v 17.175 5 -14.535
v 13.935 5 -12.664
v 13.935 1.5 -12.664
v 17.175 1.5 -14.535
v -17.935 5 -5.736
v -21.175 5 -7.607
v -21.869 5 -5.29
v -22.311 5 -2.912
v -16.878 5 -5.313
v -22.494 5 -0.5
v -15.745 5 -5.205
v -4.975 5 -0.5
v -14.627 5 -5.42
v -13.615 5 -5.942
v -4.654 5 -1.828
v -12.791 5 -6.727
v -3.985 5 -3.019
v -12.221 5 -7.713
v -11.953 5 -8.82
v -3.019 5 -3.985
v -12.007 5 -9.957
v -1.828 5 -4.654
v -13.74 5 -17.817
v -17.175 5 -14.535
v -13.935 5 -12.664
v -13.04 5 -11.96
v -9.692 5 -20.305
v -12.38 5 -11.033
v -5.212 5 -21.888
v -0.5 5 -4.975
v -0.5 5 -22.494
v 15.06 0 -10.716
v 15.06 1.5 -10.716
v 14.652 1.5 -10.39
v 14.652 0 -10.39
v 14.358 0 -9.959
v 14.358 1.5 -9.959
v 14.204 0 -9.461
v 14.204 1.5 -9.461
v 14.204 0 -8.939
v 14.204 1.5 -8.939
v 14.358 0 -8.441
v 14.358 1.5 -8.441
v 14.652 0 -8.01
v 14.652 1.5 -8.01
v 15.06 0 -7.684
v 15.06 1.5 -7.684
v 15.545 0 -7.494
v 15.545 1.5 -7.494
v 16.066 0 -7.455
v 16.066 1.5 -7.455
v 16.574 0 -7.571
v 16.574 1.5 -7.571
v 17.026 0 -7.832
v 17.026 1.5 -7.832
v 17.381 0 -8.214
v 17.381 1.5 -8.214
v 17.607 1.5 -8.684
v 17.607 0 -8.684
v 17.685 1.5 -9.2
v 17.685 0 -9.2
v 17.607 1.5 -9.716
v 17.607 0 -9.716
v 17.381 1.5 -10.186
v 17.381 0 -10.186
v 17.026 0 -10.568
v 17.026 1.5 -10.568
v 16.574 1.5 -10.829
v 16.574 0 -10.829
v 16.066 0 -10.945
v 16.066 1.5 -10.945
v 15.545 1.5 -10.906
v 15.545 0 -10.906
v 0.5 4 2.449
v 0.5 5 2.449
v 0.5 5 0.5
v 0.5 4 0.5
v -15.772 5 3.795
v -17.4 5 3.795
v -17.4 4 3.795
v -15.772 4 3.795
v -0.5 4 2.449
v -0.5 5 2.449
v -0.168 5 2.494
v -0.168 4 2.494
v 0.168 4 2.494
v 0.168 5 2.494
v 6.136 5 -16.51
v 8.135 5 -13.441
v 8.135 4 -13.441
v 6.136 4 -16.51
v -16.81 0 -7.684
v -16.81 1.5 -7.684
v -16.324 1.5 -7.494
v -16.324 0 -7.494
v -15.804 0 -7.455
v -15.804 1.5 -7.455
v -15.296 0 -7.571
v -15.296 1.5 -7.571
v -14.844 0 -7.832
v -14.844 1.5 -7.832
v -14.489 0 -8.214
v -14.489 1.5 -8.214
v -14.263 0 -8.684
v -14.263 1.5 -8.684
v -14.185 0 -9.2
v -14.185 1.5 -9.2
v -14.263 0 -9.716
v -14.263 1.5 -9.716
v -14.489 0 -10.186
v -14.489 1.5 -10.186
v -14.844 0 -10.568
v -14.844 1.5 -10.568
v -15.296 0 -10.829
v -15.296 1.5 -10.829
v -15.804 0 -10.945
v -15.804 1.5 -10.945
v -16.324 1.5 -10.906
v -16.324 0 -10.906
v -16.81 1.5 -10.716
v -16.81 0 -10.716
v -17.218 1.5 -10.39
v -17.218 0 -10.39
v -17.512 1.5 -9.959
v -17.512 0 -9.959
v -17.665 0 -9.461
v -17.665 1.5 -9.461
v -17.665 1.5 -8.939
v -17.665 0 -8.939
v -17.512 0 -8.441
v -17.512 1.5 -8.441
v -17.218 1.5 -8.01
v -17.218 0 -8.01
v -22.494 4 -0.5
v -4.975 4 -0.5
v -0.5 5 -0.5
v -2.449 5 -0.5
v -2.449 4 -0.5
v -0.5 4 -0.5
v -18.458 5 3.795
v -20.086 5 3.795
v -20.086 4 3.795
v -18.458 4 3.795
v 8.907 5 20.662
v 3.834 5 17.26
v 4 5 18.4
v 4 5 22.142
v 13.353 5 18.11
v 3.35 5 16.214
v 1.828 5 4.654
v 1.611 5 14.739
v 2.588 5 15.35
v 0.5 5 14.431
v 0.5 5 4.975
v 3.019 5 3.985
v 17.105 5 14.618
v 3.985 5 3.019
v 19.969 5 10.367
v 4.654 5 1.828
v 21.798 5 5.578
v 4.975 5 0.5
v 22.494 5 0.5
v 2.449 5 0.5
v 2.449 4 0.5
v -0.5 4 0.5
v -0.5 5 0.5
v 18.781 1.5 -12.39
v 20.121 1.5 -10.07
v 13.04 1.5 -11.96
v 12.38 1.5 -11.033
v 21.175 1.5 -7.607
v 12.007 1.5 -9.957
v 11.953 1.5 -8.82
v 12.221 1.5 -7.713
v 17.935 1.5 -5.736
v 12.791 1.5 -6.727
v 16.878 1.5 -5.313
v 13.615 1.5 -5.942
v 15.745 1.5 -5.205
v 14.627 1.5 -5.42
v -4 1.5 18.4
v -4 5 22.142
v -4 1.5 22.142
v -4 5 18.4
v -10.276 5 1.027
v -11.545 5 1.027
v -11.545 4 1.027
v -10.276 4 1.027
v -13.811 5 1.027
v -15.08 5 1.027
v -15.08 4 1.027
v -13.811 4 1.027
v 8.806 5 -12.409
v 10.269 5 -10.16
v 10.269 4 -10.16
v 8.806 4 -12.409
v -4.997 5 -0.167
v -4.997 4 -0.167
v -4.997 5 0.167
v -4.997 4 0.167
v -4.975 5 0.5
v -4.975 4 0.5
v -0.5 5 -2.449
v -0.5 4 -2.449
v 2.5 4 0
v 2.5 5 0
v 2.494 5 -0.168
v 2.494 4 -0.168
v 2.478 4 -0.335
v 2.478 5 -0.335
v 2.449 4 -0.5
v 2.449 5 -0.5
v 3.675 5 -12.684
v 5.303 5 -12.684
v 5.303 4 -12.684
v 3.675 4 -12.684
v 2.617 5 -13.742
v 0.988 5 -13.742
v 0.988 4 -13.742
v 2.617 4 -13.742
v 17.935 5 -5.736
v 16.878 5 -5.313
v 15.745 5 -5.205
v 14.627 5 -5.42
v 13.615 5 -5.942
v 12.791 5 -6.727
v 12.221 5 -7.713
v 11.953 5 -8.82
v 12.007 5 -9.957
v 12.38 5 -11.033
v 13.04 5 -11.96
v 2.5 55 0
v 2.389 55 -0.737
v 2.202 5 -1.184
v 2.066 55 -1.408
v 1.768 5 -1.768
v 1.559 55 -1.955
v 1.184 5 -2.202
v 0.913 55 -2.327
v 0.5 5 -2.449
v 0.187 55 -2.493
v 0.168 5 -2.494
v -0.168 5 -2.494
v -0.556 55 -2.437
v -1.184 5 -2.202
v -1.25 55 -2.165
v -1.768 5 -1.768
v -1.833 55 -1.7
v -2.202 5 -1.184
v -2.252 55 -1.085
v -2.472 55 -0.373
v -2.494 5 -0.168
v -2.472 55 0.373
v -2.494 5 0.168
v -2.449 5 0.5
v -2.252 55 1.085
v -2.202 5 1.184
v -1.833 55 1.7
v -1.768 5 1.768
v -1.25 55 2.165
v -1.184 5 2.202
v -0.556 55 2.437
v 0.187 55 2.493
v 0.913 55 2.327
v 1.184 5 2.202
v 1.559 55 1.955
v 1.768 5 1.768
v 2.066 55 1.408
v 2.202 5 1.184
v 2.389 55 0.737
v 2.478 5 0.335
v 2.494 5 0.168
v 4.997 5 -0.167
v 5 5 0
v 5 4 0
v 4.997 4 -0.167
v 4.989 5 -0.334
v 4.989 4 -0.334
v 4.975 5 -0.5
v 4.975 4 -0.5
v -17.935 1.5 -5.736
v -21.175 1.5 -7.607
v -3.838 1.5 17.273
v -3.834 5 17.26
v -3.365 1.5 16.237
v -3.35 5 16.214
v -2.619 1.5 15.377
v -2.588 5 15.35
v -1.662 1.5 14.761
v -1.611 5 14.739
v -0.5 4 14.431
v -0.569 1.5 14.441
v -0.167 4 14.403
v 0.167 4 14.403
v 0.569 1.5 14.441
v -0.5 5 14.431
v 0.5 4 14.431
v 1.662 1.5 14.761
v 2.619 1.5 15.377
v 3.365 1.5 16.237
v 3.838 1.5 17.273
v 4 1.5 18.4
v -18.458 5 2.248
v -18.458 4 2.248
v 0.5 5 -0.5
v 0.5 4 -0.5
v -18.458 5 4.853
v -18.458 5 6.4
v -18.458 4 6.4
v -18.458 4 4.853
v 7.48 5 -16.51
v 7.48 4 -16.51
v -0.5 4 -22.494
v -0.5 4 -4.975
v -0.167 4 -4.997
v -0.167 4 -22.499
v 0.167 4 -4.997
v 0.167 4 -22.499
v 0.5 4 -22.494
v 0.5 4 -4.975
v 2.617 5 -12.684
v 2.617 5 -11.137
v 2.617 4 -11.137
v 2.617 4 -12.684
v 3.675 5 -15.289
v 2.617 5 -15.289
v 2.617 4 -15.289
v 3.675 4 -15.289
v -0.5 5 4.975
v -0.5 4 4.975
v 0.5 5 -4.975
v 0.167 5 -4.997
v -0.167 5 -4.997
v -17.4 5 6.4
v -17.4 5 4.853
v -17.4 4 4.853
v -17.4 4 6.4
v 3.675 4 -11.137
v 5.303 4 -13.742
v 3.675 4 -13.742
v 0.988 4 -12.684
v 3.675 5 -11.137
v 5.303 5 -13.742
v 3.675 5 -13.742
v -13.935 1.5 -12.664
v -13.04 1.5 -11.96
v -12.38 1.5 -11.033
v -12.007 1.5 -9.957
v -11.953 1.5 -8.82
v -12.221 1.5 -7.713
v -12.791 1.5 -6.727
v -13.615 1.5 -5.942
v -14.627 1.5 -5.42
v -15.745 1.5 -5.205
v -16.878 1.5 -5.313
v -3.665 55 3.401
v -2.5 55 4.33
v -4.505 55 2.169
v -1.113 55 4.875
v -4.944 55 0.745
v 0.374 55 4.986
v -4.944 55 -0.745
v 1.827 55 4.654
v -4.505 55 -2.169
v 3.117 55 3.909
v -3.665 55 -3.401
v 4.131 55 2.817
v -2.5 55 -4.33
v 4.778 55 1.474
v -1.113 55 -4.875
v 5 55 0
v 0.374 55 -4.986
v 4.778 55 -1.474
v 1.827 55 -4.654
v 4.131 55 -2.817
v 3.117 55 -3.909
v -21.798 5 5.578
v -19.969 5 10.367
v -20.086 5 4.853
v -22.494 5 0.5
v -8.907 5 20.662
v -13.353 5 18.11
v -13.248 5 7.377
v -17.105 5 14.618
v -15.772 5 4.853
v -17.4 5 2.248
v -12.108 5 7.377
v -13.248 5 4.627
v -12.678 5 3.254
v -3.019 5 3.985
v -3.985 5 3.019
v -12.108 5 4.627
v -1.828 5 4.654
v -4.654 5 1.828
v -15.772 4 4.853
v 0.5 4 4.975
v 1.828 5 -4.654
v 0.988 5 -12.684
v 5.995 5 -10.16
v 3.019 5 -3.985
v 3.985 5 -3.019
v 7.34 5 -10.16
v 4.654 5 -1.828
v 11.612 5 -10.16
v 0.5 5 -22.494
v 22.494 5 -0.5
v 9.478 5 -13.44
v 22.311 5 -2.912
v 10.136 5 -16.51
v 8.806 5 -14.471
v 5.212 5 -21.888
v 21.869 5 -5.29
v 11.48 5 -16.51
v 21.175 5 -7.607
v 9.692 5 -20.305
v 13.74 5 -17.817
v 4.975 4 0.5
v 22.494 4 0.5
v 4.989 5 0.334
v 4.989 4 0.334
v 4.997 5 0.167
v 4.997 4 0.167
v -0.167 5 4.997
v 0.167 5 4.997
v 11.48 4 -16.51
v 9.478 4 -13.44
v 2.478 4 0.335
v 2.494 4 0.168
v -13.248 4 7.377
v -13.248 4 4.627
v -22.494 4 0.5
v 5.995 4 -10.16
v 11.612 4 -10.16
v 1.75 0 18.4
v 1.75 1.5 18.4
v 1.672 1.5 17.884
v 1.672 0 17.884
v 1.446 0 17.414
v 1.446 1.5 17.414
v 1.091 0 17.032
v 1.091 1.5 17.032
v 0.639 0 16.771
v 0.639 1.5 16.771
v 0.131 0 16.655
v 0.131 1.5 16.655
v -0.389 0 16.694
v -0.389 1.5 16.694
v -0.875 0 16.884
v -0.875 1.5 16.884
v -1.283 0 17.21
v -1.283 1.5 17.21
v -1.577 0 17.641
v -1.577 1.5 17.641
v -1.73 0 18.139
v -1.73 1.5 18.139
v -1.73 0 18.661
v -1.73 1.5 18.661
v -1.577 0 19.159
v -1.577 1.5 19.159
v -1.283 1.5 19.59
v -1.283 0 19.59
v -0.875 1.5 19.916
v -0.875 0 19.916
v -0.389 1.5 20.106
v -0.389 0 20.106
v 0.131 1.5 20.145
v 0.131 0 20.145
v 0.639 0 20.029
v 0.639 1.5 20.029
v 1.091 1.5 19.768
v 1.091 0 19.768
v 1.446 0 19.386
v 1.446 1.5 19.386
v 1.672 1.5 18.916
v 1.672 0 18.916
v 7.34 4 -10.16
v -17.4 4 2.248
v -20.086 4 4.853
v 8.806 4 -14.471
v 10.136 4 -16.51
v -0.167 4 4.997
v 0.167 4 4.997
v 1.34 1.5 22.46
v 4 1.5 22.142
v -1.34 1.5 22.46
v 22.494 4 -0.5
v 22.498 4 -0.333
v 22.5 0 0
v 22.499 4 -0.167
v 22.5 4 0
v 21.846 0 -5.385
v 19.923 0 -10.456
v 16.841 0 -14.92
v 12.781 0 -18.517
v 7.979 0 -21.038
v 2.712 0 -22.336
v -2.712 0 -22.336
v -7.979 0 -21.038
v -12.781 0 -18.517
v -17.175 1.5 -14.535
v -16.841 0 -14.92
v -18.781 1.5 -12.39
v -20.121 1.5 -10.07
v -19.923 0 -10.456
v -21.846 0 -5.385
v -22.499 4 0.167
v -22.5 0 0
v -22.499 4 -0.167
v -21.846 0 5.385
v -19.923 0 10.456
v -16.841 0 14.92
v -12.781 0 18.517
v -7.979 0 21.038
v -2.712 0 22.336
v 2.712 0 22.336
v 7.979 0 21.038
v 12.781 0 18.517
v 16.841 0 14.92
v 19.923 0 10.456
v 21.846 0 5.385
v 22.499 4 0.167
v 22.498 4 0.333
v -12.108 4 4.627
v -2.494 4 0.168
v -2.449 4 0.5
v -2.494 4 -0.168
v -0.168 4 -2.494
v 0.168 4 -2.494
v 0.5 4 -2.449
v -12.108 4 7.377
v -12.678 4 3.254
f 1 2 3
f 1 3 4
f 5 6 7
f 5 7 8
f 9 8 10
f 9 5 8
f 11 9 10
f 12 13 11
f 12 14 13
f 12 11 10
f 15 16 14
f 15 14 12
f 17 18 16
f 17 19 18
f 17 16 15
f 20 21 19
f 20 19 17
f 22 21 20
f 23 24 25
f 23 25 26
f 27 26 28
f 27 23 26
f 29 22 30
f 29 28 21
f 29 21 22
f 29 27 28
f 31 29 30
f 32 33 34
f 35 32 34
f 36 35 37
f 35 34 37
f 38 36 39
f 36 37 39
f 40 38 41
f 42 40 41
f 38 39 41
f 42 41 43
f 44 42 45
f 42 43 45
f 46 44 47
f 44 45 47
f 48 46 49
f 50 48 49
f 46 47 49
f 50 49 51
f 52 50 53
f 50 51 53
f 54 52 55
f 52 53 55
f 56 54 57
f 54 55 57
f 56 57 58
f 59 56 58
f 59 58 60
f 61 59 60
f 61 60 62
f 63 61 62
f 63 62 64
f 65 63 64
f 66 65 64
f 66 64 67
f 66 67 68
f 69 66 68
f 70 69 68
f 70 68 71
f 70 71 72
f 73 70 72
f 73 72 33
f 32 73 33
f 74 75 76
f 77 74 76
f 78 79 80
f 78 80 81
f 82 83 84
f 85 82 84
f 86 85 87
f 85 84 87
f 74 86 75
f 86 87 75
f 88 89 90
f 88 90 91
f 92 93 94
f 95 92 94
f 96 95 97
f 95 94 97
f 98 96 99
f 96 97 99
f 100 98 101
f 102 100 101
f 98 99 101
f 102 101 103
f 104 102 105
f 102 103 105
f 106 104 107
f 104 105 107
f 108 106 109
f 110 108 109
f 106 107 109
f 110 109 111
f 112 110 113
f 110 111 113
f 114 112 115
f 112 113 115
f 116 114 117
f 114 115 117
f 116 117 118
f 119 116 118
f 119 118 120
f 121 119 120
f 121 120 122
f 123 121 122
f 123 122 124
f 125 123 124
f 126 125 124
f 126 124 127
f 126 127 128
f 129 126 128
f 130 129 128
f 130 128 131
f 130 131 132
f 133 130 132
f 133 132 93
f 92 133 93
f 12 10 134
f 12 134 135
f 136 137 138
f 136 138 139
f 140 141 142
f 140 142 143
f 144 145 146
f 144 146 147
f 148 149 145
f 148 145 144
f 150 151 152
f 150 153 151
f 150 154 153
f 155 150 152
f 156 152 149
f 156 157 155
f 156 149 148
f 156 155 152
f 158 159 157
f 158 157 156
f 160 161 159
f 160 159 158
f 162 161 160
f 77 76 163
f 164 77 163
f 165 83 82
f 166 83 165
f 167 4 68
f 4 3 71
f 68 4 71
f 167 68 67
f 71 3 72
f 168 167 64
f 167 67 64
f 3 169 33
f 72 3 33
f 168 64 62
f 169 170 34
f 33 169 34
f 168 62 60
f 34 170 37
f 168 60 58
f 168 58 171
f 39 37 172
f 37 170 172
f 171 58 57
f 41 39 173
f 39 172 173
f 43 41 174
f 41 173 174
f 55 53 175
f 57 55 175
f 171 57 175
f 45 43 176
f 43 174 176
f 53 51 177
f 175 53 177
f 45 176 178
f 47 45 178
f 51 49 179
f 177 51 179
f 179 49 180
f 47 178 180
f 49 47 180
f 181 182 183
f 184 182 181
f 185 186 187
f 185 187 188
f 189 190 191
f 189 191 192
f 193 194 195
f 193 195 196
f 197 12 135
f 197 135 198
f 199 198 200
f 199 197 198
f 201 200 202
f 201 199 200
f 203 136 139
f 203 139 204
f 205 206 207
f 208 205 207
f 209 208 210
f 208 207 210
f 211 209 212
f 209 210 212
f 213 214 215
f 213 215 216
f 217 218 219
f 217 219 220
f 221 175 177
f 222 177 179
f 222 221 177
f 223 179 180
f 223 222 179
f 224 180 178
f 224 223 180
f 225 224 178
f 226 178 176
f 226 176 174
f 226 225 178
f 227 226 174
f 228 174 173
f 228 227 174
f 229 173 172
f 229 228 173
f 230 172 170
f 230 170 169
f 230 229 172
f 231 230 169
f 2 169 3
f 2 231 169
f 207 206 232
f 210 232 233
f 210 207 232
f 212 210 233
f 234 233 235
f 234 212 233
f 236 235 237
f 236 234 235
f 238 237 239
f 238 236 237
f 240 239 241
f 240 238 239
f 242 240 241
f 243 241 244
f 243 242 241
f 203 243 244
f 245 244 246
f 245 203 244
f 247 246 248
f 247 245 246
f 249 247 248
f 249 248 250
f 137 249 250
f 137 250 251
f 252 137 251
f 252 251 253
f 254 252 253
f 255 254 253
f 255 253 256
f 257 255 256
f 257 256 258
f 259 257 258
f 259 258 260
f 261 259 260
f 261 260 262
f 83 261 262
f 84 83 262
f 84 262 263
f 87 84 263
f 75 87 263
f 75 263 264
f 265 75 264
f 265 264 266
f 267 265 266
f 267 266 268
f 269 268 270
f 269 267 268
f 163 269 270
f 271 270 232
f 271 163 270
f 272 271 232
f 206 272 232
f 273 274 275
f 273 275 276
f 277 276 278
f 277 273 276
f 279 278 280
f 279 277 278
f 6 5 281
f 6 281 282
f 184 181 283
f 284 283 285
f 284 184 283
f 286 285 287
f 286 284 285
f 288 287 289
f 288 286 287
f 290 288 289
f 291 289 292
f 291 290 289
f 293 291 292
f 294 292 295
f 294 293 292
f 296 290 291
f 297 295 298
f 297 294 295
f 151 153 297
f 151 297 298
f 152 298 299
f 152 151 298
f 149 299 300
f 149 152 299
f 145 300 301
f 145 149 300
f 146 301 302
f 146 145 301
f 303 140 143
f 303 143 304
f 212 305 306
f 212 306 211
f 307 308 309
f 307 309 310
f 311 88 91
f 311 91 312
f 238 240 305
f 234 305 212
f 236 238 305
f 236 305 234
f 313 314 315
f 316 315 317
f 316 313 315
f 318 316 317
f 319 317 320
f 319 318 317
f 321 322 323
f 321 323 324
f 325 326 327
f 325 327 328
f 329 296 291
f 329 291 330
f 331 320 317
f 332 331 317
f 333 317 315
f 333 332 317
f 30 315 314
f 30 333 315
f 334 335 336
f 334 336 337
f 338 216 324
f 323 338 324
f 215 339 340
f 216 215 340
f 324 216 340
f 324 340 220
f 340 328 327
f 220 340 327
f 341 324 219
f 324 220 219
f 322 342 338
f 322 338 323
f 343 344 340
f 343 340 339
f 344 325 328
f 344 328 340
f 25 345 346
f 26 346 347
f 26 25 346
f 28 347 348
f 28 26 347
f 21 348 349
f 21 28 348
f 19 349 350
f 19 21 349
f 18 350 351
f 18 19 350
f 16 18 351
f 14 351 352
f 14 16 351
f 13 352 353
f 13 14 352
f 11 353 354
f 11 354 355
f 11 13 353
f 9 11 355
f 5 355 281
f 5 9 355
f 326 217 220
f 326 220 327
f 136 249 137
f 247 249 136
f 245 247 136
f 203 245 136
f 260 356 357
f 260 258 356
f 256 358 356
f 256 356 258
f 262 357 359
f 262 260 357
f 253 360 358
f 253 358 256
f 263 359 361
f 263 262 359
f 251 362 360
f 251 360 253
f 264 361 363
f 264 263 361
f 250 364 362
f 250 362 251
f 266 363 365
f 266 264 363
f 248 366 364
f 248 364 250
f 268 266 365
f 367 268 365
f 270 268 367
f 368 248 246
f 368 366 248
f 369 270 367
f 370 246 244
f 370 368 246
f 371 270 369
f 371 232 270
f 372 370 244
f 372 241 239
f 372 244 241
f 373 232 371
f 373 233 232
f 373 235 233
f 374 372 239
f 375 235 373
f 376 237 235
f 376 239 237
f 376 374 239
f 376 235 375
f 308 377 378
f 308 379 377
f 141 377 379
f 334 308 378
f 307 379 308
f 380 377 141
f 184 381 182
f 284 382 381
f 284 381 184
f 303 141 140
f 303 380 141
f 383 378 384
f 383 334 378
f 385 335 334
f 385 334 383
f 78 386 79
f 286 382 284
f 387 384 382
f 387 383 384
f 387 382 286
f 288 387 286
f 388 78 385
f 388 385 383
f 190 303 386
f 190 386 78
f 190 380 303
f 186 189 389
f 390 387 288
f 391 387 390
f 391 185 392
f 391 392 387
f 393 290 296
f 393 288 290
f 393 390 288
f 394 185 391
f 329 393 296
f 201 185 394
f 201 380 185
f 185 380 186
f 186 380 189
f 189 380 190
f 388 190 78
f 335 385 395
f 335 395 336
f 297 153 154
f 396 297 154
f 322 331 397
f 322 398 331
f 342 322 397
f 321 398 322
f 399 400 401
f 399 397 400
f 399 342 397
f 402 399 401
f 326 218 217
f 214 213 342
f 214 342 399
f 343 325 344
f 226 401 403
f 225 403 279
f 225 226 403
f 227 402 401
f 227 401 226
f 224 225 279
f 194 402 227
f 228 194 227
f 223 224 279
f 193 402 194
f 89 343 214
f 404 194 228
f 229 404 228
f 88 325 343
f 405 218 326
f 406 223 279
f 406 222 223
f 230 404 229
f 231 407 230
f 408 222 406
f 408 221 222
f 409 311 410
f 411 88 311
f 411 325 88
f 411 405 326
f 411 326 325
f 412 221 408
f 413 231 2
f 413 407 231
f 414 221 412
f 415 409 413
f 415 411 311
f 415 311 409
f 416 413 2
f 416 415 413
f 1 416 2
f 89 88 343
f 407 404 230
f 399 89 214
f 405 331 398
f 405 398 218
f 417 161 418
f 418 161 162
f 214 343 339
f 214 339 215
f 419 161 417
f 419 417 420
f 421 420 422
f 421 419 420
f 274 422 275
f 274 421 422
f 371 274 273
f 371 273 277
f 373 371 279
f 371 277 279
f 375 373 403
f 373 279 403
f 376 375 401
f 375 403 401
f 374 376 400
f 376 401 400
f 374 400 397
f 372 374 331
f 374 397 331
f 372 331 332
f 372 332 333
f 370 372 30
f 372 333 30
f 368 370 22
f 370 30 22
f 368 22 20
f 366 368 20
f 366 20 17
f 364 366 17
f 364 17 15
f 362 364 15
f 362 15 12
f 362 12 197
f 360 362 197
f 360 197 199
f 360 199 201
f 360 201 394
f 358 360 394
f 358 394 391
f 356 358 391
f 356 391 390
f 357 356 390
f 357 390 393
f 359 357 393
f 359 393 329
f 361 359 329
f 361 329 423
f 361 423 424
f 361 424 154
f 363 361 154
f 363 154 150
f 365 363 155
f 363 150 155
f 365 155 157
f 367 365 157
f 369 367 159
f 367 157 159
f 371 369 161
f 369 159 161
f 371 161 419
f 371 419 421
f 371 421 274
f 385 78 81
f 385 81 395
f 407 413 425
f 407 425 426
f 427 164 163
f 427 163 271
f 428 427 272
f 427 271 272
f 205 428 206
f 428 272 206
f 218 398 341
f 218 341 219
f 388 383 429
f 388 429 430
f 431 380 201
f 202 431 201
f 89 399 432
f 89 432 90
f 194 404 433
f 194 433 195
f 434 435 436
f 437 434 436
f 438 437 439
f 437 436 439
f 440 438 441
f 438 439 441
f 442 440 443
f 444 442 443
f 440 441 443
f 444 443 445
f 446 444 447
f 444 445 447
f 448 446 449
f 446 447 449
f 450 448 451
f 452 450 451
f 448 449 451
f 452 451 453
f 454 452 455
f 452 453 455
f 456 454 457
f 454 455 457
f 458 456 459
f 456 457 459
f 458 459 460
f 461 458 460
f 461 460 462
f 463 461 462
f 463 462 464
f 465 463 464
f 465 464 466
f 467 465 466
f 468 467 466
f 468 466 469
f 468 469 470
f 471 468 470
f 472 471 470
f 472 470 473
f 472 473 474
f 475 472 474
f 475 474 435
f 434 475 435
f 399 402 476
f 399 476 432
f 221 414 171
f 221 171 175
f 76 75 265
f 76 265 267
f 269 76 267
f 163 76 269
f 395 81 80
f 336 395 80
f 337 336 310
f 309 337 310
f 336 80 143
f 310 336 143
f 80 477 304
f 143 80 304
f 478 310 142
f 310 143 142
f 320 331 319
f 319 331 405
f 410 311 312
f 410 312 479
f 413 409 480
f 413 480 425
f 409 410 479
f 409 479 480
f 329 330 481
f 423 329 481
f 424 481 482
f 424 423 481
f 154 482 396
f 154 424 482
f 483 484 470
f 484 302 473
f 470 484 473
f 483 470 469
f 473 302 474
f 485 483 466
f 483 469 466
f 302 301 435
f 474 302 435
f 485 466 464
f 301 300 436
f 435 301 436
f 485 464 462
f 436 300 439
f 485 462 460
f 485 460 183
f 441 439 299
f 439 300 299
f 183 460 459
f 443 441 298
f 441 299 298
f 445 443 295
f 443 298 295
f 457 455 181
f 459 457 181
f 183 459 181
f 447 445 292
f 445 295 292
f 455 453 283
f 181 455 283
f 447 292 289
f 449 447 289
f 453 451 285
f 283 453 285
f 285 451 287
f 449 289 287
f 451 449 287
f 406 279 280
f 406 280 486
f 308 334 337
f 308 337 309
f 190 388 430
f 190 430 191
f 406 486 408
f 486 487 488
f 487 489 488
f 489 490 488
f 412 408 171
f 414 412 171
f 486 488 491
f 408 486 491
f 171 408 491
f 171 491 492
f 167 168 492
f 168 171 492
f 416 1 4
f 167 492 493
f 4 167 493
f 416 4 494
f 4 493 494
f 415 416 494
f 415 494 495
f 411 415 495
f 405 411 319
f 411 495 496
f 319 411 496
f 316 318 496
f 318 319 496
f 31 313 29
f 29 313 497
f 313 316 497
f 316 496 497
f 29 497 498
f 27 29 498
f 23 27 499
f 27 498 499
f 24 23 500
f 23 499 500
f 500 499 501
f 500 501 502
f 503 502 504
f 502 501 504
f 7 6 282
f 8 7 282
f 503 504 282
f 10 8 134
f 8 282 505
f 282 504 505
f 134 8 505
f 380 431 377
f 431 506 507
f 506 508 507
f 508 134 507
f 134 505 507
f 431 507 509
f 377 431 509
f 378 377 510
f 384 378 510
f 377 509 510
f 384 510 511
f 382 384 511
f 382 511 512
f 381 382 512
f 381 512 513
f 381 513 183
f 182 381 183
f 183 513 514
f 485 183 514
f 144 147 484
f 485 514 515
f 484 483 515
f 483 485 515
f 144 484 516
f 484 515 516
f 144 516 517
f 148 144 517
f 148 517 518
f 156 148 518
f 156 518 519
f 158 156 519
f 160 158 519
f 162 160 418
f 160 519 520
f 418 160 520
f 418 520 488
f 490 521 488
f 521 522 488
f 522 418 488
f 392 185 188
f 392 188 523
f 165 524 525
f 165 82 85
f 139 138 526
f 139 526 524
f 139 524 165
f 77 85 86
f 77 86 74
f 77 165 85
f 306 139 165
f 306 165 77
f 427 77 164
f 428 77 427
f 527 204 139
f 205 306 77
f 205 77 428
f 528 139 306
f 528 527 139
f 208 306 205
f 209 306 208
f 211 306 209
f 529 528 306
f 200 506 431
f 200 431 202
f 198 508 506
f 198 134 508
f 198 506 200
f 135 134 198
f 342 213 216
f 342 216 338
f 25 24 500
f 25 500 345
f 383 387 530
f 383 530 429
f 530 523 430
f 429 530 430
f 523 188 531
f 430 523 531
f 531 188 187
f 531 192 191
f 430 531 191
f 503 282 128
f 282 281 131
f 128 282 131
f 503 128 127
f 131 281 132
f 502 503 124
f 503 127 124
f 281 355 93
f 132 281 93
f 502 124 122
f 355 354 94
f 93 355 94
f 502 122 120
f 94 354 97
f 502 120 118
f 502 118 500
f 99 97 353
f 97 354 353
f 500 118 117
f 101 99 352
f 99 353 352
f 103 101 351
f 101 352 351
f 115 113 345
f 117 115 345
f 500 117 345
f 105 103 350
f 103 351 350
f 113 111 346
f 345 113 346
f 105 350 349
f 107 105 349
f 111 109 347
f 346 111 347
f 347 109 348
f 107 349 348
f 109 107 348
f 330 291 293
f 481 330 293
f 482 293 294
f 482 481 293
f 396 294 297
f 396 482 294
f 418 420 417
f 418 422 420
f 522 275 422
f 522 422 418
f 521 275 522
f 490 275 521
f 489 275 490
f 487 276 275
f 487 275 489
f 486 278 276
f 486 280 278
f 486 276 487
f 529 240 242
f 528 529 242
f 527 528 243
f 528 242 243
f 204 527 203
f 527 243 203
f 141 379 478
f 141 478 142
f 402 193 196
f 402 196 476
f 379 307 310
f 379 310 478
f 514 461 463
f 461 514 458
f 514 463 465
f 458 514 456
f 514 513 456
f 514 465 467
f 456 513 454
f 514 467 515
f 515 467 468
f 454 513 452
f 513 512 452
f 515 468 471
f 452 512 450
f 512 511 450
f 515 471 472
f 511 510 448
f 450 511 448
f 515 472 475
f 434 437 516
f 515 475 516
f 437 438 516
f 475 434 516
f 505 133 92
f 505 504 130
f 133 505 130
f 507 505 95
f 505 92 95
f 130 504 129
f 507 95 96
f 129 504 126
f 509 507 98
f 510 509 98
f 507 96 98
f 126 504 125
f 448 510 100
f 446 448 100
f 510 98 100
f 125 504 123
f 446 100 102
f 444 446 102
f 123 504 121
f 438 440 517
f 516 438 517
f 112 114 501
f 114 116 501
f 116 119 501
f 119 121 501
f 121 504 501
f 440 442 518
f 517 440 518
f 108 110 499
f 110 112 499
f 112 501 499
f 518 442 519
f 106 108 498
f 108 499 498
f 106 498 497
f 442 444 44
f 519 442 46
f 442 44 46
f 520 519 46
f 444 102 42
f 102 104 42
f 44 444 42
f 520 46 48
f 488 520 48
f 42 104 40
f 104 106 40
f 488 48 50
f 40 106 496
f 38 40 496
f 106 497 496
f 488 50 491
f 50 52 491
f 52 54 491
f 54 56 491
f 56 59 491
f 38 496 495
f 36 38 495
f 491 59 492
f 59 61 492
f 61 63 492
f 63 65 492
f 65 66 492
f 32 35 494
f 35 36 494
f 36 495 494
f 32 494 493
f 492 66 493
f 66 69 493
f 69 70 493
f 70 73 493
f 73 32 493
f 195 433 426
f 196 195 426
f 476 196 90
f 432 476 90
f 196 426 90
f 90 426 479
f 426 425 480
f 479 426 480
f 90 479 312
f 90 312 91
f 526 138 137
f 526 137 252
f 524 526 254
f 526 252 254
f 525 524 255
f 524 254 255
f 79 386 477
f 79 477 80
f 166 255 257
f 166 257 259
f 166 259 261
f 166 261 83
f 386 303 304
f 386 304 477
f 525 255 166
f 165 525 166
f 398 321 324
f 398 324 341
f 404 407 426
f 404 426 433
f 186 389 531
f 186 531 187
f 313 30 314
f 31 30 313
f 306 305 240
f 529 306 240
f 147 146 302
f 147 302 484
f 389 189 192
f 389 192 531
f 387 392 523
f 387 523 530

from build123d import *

# Parameters (mm, degrees)
SKETCH1_R                = 22.5
PLATE_DEPTH              = 5
OPENING_START            = 1.5
OPENING_FOR_SCREW_DEPTH  = 5
SKETCH7_R                = 1.75
SCREW_HOLE_DEPTH         = 5
CIRPATTERN20_COUNT       = 3
SKETCH10_W               = 45
SKETCH10_H               = 1
SKETCH10_W_2             = 1
SKETCH10_H_2             = 45
CUT_EXTRUDE5_DEPTH       = 1
CUT_EXTRUDE6_DEPTH       = 1
SKETCH12_R               = 5
SKETCH12_R_2             = 2.5
BOSS_EXTRUDE2_DEPTH      = 50
BOSS_EXTRUDE2_DEPTH_BACK = 1


with BuildPart() as part:
    # Sketch1 → plate (new body)
    with BuildSketch(Plane(origin=(0, 0, 0), x_dir=(1, 0, 0), z_dir=(0, 1, 0))):
        Circle(SKETCH1_R)
    extrude(amount=PLATE_DEPTH)

    # Sketch6 → opening for screw (cut)
    with BuildSketch(Plane(origin=(0, 5, 0), x_dir=(1, 0, 0), z_dir=(0, 1, 0)).offset(OPENING_START)):
        with BuildLine():
            Line((-4, -22.5), (-4, -18.4))
            ThreePointArc((-4, -18.4), (0, -14.4), (4, -18.4))
            Line((4, -18.4), (4, -22.5))
            ThreePointArc((4, -22.5), (0, -26.5), (-4, -22.5))
        make_face()
    opening_for_screw = extrude(amount=-OPENING_FOR_SCREW_DEPTH, mode=Mode.SUBTRACT)

    # Sketch7 → screw hole (cut)
    with BuildSketch(Plane(origin=(0, 1.5, 0), x_dir=(1, 0, 0), z_dir=(0, 1, 0))):
        with Locations((0, -18.4)):
            Circle(SKETCH7_R)
    screw_hole = extrude(amount=-SCREW_HOLE_DEPTH, mode=Mode.SUBTRACT)

    # CirPattern20: opening for screw, screw hole ×3 about axis
    cirpattern20_axis = Axis((0, 0, 0), (0, 1, 0))
    for i in range(1, CIRPATTERN20_COUNT):
        add(opening_for_screw.rotate(cirpattern20_axis, i * 360 / CIRPATTERN20_COUNT), mode=Mode.SUBTRACT)
        add(screw_hole.rotate(cirpattern20_axis, i * 360 / CIRPATTERN20_COUNT), mode=Mode.SUBTRACT)

    # Sketch10 → Cut-Extrude5 (cut)
    with BuildSketch(Plane(origin=(0, 5, 0), x_dir=(1, 0, 0), z_dir=(0, 1, 0))):
        Rectangle(SKETCH10_W, SKETCH10_H)
        Rectangle(SKETCH10_W_2, SKETCH10_H_2)
    extrude(amount=-CUT_EXTRUDE5_DEPTH, mode=Mode.SUBTRACT)

    # Sketch11 → Cut-Extrude6 (cut)
    with BuildSketch(Plane(origin=(0, 5, 0), x_dir=(1, 0, 0), z_dir=(0, 1, 0))):
        Polygon((2.616666667, 13.742425761), (2.616666667, 15.289220632), (3.675, 15.289220632), (3.675, 13.742425761), (5.303205128, 13.742425761), (5.303205128, 12.684092427), (3.675, 12.684092427), (3.675, 11.137297556), (2.616666667, 11.137297556), (2.616666667, 12.684092427), (0.988461538, 12.684092427), (0.988461538, 13.742425761), align=None)
        Polygon((6.136388221, 16.510374479), (7.479657452, 16.510374479), (8.806390224, 14.471301963), (10.135667067, 16.510374479), (11.480208333, 16.510374479), (9.47802484, 13.43968137), (11.6125, 10.160374479), (10.269230769, 10.160374479), (8.806390224, 12.409332812), (7.339733574, 10.160374479), (5.995192308, 10.160374479), (8.134755609, 13.440953405), align=None)
        Polygon((-18.458103671, -3.794817635), (-18.458103671, -2.248022763), (-17.399770338, -2.248022763), (-17.399770338, -3.794817635), (-15.771565209, -3.794817635), (-15.771565209, -4.853150968), (-17.399770338, -4.853150968), (-17.399770338, -6.39994584), (-18.458103671, -6.39994584), (-18.458103671, -4.853150968), (-20.086308799, -4.853150968), (-20.086308799, -3.794817635), align=None)
        Polygon((-15.07957803, -1.026868917), (-13.811358879, -1.026868917), (-12.677975466, -3.254202651), (-11.544592052, -1.026868917), (-10.276372902, -1.026868917), (-12.108103671, -4.626728693), (-12.108103671, -7.376868917), (-13.247847261, -7.376868917), (-13.247847261, -4.626728693), align=None)
    extrude(amount=-CUT_EXTRUDE6_DEPTH, mode=Mode.SUBTRACT)

    # Sketch12 → Boss-Extrude2 (add, two sides)
    with BuildSketch(Plane(origin=(0, 5, 0), x_dir=(1, 0, 0), z_dir=(0, 1, 0))) as boss_extrude2_sk:
        Circle(SKETCH12_R)
        Circle(SKETCH12_R_2, mode=Mode.SUBTRACT)
    extrude(amount=BOSS_EXTRUDE2_DEPTH)
    extrude(boss_extrude2_sk.sketch, amount=-BOSS_EXTRUDE2_DEPTH_BACK)


solid = part.part
